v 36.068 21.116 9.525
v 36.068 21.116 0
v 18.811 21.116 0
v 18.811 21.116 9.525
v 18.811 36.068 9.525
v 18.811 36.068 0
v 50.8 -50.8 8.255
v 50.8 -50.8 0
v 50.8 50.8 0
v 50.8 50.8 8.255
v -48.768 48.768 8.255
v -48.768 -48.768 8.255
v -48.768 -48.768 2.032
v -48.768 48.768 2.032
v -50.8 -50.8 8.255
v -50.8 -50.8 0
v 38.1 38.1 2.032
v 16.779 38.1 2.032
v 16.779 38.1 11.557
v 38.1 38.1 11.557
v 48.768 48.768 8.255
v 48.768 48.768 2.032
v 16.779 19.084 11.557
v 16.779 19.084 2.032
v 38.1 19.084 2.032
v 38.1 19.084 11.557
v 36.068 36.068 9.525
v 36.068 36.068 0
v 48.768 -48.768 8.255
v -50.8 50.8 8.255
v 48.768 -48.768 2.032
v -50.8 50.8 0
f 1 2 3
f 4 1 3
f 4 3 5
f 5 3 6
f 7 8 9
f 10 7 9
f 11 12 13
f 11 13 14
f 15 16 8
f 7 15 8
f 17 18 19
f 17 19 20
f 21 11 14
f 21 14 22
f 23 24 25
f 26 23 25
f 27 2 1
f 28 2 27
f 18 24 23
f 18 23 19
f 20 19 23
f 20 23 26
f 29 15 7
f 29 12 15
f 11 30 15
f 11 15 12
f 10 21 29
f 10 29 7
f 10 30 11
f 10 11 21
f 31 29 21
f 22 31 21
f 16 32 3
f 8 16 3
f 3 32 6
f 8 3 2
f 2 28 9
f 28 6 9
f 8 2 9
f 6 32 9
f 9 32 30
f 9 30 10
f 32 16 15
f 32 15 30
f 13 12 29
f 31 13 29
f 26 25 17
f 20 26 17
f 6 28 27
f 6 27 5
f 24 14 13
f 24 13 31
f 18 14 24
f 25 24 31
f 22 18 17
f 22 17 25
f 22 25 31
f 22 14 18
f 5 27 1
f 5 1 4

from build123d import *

# Parameters (mm, degrees)
SKETCH1_W           = 101.6
SKETCH1_H           = 101.6
BOSS_EXTRUDE1_DEPTH = 8.255
SKETCH3_W           = 97.536
SKETCH3_H           = 97.536
CUT_EXTRUDE1_DEPTH  = 6.223
SKETCH4_W           = 21.321387129
SKETCH4_H           = 19.016372304
BOSS_EXTRUDE2_DEPTH = 9.525
SKETCH6_W           = 17.257387129
SKETCH6_H           = 14.952372304
CUT_EXTRUDE2_DEPTH  = 9.525


with BuildPart() as part:
    # Sketch1 → Boss-Extrude1 (new body)
    with BuildSketch(Plane.XY):
        Rectangle(SKETCH1_W, SKETCH1_H)
    extrude(amount=BOSS_EXTRUDE1_DEPTH)

    # Sketch3 → Cut-Extrude1 (cut)
    with BuildSketch(Plane.XY.offset(8.255)):
        Rectangle(SKETCH3_W, SKETCH3_H)
    extrude(amount=-CUT_EXTRUDE1_DEPTH, mode=Mode.SUBTRACT)

    # Sketch4 → Boss-Extrude2 (add)
    with BuildSketch(Plane.XY.offset(2.032)):
        with Locations((27.439306436, 28.591813848)):
            Rectangle(SKETCH4_W, SKETCH4_H)
    extrude(amount=BOSS_EXTRUDE2_DEPTH)

    # Sketch6 → Cut-Extrude2 (cut)
    with BuildSketch(Plane(origin=(0, 0, 0), x_dir=(-1, 0, 0), z_dir=(0, 0, -1))):
        with Locations((-27.439306436, 28.591813848)):
            Rectangle(SKETCH6_W, SKETCH6_H)
    extrude(amount=-CUT_EXTRUDE2_DEPTH, mode=Mode.SUBTRACT)


solid = part.part
